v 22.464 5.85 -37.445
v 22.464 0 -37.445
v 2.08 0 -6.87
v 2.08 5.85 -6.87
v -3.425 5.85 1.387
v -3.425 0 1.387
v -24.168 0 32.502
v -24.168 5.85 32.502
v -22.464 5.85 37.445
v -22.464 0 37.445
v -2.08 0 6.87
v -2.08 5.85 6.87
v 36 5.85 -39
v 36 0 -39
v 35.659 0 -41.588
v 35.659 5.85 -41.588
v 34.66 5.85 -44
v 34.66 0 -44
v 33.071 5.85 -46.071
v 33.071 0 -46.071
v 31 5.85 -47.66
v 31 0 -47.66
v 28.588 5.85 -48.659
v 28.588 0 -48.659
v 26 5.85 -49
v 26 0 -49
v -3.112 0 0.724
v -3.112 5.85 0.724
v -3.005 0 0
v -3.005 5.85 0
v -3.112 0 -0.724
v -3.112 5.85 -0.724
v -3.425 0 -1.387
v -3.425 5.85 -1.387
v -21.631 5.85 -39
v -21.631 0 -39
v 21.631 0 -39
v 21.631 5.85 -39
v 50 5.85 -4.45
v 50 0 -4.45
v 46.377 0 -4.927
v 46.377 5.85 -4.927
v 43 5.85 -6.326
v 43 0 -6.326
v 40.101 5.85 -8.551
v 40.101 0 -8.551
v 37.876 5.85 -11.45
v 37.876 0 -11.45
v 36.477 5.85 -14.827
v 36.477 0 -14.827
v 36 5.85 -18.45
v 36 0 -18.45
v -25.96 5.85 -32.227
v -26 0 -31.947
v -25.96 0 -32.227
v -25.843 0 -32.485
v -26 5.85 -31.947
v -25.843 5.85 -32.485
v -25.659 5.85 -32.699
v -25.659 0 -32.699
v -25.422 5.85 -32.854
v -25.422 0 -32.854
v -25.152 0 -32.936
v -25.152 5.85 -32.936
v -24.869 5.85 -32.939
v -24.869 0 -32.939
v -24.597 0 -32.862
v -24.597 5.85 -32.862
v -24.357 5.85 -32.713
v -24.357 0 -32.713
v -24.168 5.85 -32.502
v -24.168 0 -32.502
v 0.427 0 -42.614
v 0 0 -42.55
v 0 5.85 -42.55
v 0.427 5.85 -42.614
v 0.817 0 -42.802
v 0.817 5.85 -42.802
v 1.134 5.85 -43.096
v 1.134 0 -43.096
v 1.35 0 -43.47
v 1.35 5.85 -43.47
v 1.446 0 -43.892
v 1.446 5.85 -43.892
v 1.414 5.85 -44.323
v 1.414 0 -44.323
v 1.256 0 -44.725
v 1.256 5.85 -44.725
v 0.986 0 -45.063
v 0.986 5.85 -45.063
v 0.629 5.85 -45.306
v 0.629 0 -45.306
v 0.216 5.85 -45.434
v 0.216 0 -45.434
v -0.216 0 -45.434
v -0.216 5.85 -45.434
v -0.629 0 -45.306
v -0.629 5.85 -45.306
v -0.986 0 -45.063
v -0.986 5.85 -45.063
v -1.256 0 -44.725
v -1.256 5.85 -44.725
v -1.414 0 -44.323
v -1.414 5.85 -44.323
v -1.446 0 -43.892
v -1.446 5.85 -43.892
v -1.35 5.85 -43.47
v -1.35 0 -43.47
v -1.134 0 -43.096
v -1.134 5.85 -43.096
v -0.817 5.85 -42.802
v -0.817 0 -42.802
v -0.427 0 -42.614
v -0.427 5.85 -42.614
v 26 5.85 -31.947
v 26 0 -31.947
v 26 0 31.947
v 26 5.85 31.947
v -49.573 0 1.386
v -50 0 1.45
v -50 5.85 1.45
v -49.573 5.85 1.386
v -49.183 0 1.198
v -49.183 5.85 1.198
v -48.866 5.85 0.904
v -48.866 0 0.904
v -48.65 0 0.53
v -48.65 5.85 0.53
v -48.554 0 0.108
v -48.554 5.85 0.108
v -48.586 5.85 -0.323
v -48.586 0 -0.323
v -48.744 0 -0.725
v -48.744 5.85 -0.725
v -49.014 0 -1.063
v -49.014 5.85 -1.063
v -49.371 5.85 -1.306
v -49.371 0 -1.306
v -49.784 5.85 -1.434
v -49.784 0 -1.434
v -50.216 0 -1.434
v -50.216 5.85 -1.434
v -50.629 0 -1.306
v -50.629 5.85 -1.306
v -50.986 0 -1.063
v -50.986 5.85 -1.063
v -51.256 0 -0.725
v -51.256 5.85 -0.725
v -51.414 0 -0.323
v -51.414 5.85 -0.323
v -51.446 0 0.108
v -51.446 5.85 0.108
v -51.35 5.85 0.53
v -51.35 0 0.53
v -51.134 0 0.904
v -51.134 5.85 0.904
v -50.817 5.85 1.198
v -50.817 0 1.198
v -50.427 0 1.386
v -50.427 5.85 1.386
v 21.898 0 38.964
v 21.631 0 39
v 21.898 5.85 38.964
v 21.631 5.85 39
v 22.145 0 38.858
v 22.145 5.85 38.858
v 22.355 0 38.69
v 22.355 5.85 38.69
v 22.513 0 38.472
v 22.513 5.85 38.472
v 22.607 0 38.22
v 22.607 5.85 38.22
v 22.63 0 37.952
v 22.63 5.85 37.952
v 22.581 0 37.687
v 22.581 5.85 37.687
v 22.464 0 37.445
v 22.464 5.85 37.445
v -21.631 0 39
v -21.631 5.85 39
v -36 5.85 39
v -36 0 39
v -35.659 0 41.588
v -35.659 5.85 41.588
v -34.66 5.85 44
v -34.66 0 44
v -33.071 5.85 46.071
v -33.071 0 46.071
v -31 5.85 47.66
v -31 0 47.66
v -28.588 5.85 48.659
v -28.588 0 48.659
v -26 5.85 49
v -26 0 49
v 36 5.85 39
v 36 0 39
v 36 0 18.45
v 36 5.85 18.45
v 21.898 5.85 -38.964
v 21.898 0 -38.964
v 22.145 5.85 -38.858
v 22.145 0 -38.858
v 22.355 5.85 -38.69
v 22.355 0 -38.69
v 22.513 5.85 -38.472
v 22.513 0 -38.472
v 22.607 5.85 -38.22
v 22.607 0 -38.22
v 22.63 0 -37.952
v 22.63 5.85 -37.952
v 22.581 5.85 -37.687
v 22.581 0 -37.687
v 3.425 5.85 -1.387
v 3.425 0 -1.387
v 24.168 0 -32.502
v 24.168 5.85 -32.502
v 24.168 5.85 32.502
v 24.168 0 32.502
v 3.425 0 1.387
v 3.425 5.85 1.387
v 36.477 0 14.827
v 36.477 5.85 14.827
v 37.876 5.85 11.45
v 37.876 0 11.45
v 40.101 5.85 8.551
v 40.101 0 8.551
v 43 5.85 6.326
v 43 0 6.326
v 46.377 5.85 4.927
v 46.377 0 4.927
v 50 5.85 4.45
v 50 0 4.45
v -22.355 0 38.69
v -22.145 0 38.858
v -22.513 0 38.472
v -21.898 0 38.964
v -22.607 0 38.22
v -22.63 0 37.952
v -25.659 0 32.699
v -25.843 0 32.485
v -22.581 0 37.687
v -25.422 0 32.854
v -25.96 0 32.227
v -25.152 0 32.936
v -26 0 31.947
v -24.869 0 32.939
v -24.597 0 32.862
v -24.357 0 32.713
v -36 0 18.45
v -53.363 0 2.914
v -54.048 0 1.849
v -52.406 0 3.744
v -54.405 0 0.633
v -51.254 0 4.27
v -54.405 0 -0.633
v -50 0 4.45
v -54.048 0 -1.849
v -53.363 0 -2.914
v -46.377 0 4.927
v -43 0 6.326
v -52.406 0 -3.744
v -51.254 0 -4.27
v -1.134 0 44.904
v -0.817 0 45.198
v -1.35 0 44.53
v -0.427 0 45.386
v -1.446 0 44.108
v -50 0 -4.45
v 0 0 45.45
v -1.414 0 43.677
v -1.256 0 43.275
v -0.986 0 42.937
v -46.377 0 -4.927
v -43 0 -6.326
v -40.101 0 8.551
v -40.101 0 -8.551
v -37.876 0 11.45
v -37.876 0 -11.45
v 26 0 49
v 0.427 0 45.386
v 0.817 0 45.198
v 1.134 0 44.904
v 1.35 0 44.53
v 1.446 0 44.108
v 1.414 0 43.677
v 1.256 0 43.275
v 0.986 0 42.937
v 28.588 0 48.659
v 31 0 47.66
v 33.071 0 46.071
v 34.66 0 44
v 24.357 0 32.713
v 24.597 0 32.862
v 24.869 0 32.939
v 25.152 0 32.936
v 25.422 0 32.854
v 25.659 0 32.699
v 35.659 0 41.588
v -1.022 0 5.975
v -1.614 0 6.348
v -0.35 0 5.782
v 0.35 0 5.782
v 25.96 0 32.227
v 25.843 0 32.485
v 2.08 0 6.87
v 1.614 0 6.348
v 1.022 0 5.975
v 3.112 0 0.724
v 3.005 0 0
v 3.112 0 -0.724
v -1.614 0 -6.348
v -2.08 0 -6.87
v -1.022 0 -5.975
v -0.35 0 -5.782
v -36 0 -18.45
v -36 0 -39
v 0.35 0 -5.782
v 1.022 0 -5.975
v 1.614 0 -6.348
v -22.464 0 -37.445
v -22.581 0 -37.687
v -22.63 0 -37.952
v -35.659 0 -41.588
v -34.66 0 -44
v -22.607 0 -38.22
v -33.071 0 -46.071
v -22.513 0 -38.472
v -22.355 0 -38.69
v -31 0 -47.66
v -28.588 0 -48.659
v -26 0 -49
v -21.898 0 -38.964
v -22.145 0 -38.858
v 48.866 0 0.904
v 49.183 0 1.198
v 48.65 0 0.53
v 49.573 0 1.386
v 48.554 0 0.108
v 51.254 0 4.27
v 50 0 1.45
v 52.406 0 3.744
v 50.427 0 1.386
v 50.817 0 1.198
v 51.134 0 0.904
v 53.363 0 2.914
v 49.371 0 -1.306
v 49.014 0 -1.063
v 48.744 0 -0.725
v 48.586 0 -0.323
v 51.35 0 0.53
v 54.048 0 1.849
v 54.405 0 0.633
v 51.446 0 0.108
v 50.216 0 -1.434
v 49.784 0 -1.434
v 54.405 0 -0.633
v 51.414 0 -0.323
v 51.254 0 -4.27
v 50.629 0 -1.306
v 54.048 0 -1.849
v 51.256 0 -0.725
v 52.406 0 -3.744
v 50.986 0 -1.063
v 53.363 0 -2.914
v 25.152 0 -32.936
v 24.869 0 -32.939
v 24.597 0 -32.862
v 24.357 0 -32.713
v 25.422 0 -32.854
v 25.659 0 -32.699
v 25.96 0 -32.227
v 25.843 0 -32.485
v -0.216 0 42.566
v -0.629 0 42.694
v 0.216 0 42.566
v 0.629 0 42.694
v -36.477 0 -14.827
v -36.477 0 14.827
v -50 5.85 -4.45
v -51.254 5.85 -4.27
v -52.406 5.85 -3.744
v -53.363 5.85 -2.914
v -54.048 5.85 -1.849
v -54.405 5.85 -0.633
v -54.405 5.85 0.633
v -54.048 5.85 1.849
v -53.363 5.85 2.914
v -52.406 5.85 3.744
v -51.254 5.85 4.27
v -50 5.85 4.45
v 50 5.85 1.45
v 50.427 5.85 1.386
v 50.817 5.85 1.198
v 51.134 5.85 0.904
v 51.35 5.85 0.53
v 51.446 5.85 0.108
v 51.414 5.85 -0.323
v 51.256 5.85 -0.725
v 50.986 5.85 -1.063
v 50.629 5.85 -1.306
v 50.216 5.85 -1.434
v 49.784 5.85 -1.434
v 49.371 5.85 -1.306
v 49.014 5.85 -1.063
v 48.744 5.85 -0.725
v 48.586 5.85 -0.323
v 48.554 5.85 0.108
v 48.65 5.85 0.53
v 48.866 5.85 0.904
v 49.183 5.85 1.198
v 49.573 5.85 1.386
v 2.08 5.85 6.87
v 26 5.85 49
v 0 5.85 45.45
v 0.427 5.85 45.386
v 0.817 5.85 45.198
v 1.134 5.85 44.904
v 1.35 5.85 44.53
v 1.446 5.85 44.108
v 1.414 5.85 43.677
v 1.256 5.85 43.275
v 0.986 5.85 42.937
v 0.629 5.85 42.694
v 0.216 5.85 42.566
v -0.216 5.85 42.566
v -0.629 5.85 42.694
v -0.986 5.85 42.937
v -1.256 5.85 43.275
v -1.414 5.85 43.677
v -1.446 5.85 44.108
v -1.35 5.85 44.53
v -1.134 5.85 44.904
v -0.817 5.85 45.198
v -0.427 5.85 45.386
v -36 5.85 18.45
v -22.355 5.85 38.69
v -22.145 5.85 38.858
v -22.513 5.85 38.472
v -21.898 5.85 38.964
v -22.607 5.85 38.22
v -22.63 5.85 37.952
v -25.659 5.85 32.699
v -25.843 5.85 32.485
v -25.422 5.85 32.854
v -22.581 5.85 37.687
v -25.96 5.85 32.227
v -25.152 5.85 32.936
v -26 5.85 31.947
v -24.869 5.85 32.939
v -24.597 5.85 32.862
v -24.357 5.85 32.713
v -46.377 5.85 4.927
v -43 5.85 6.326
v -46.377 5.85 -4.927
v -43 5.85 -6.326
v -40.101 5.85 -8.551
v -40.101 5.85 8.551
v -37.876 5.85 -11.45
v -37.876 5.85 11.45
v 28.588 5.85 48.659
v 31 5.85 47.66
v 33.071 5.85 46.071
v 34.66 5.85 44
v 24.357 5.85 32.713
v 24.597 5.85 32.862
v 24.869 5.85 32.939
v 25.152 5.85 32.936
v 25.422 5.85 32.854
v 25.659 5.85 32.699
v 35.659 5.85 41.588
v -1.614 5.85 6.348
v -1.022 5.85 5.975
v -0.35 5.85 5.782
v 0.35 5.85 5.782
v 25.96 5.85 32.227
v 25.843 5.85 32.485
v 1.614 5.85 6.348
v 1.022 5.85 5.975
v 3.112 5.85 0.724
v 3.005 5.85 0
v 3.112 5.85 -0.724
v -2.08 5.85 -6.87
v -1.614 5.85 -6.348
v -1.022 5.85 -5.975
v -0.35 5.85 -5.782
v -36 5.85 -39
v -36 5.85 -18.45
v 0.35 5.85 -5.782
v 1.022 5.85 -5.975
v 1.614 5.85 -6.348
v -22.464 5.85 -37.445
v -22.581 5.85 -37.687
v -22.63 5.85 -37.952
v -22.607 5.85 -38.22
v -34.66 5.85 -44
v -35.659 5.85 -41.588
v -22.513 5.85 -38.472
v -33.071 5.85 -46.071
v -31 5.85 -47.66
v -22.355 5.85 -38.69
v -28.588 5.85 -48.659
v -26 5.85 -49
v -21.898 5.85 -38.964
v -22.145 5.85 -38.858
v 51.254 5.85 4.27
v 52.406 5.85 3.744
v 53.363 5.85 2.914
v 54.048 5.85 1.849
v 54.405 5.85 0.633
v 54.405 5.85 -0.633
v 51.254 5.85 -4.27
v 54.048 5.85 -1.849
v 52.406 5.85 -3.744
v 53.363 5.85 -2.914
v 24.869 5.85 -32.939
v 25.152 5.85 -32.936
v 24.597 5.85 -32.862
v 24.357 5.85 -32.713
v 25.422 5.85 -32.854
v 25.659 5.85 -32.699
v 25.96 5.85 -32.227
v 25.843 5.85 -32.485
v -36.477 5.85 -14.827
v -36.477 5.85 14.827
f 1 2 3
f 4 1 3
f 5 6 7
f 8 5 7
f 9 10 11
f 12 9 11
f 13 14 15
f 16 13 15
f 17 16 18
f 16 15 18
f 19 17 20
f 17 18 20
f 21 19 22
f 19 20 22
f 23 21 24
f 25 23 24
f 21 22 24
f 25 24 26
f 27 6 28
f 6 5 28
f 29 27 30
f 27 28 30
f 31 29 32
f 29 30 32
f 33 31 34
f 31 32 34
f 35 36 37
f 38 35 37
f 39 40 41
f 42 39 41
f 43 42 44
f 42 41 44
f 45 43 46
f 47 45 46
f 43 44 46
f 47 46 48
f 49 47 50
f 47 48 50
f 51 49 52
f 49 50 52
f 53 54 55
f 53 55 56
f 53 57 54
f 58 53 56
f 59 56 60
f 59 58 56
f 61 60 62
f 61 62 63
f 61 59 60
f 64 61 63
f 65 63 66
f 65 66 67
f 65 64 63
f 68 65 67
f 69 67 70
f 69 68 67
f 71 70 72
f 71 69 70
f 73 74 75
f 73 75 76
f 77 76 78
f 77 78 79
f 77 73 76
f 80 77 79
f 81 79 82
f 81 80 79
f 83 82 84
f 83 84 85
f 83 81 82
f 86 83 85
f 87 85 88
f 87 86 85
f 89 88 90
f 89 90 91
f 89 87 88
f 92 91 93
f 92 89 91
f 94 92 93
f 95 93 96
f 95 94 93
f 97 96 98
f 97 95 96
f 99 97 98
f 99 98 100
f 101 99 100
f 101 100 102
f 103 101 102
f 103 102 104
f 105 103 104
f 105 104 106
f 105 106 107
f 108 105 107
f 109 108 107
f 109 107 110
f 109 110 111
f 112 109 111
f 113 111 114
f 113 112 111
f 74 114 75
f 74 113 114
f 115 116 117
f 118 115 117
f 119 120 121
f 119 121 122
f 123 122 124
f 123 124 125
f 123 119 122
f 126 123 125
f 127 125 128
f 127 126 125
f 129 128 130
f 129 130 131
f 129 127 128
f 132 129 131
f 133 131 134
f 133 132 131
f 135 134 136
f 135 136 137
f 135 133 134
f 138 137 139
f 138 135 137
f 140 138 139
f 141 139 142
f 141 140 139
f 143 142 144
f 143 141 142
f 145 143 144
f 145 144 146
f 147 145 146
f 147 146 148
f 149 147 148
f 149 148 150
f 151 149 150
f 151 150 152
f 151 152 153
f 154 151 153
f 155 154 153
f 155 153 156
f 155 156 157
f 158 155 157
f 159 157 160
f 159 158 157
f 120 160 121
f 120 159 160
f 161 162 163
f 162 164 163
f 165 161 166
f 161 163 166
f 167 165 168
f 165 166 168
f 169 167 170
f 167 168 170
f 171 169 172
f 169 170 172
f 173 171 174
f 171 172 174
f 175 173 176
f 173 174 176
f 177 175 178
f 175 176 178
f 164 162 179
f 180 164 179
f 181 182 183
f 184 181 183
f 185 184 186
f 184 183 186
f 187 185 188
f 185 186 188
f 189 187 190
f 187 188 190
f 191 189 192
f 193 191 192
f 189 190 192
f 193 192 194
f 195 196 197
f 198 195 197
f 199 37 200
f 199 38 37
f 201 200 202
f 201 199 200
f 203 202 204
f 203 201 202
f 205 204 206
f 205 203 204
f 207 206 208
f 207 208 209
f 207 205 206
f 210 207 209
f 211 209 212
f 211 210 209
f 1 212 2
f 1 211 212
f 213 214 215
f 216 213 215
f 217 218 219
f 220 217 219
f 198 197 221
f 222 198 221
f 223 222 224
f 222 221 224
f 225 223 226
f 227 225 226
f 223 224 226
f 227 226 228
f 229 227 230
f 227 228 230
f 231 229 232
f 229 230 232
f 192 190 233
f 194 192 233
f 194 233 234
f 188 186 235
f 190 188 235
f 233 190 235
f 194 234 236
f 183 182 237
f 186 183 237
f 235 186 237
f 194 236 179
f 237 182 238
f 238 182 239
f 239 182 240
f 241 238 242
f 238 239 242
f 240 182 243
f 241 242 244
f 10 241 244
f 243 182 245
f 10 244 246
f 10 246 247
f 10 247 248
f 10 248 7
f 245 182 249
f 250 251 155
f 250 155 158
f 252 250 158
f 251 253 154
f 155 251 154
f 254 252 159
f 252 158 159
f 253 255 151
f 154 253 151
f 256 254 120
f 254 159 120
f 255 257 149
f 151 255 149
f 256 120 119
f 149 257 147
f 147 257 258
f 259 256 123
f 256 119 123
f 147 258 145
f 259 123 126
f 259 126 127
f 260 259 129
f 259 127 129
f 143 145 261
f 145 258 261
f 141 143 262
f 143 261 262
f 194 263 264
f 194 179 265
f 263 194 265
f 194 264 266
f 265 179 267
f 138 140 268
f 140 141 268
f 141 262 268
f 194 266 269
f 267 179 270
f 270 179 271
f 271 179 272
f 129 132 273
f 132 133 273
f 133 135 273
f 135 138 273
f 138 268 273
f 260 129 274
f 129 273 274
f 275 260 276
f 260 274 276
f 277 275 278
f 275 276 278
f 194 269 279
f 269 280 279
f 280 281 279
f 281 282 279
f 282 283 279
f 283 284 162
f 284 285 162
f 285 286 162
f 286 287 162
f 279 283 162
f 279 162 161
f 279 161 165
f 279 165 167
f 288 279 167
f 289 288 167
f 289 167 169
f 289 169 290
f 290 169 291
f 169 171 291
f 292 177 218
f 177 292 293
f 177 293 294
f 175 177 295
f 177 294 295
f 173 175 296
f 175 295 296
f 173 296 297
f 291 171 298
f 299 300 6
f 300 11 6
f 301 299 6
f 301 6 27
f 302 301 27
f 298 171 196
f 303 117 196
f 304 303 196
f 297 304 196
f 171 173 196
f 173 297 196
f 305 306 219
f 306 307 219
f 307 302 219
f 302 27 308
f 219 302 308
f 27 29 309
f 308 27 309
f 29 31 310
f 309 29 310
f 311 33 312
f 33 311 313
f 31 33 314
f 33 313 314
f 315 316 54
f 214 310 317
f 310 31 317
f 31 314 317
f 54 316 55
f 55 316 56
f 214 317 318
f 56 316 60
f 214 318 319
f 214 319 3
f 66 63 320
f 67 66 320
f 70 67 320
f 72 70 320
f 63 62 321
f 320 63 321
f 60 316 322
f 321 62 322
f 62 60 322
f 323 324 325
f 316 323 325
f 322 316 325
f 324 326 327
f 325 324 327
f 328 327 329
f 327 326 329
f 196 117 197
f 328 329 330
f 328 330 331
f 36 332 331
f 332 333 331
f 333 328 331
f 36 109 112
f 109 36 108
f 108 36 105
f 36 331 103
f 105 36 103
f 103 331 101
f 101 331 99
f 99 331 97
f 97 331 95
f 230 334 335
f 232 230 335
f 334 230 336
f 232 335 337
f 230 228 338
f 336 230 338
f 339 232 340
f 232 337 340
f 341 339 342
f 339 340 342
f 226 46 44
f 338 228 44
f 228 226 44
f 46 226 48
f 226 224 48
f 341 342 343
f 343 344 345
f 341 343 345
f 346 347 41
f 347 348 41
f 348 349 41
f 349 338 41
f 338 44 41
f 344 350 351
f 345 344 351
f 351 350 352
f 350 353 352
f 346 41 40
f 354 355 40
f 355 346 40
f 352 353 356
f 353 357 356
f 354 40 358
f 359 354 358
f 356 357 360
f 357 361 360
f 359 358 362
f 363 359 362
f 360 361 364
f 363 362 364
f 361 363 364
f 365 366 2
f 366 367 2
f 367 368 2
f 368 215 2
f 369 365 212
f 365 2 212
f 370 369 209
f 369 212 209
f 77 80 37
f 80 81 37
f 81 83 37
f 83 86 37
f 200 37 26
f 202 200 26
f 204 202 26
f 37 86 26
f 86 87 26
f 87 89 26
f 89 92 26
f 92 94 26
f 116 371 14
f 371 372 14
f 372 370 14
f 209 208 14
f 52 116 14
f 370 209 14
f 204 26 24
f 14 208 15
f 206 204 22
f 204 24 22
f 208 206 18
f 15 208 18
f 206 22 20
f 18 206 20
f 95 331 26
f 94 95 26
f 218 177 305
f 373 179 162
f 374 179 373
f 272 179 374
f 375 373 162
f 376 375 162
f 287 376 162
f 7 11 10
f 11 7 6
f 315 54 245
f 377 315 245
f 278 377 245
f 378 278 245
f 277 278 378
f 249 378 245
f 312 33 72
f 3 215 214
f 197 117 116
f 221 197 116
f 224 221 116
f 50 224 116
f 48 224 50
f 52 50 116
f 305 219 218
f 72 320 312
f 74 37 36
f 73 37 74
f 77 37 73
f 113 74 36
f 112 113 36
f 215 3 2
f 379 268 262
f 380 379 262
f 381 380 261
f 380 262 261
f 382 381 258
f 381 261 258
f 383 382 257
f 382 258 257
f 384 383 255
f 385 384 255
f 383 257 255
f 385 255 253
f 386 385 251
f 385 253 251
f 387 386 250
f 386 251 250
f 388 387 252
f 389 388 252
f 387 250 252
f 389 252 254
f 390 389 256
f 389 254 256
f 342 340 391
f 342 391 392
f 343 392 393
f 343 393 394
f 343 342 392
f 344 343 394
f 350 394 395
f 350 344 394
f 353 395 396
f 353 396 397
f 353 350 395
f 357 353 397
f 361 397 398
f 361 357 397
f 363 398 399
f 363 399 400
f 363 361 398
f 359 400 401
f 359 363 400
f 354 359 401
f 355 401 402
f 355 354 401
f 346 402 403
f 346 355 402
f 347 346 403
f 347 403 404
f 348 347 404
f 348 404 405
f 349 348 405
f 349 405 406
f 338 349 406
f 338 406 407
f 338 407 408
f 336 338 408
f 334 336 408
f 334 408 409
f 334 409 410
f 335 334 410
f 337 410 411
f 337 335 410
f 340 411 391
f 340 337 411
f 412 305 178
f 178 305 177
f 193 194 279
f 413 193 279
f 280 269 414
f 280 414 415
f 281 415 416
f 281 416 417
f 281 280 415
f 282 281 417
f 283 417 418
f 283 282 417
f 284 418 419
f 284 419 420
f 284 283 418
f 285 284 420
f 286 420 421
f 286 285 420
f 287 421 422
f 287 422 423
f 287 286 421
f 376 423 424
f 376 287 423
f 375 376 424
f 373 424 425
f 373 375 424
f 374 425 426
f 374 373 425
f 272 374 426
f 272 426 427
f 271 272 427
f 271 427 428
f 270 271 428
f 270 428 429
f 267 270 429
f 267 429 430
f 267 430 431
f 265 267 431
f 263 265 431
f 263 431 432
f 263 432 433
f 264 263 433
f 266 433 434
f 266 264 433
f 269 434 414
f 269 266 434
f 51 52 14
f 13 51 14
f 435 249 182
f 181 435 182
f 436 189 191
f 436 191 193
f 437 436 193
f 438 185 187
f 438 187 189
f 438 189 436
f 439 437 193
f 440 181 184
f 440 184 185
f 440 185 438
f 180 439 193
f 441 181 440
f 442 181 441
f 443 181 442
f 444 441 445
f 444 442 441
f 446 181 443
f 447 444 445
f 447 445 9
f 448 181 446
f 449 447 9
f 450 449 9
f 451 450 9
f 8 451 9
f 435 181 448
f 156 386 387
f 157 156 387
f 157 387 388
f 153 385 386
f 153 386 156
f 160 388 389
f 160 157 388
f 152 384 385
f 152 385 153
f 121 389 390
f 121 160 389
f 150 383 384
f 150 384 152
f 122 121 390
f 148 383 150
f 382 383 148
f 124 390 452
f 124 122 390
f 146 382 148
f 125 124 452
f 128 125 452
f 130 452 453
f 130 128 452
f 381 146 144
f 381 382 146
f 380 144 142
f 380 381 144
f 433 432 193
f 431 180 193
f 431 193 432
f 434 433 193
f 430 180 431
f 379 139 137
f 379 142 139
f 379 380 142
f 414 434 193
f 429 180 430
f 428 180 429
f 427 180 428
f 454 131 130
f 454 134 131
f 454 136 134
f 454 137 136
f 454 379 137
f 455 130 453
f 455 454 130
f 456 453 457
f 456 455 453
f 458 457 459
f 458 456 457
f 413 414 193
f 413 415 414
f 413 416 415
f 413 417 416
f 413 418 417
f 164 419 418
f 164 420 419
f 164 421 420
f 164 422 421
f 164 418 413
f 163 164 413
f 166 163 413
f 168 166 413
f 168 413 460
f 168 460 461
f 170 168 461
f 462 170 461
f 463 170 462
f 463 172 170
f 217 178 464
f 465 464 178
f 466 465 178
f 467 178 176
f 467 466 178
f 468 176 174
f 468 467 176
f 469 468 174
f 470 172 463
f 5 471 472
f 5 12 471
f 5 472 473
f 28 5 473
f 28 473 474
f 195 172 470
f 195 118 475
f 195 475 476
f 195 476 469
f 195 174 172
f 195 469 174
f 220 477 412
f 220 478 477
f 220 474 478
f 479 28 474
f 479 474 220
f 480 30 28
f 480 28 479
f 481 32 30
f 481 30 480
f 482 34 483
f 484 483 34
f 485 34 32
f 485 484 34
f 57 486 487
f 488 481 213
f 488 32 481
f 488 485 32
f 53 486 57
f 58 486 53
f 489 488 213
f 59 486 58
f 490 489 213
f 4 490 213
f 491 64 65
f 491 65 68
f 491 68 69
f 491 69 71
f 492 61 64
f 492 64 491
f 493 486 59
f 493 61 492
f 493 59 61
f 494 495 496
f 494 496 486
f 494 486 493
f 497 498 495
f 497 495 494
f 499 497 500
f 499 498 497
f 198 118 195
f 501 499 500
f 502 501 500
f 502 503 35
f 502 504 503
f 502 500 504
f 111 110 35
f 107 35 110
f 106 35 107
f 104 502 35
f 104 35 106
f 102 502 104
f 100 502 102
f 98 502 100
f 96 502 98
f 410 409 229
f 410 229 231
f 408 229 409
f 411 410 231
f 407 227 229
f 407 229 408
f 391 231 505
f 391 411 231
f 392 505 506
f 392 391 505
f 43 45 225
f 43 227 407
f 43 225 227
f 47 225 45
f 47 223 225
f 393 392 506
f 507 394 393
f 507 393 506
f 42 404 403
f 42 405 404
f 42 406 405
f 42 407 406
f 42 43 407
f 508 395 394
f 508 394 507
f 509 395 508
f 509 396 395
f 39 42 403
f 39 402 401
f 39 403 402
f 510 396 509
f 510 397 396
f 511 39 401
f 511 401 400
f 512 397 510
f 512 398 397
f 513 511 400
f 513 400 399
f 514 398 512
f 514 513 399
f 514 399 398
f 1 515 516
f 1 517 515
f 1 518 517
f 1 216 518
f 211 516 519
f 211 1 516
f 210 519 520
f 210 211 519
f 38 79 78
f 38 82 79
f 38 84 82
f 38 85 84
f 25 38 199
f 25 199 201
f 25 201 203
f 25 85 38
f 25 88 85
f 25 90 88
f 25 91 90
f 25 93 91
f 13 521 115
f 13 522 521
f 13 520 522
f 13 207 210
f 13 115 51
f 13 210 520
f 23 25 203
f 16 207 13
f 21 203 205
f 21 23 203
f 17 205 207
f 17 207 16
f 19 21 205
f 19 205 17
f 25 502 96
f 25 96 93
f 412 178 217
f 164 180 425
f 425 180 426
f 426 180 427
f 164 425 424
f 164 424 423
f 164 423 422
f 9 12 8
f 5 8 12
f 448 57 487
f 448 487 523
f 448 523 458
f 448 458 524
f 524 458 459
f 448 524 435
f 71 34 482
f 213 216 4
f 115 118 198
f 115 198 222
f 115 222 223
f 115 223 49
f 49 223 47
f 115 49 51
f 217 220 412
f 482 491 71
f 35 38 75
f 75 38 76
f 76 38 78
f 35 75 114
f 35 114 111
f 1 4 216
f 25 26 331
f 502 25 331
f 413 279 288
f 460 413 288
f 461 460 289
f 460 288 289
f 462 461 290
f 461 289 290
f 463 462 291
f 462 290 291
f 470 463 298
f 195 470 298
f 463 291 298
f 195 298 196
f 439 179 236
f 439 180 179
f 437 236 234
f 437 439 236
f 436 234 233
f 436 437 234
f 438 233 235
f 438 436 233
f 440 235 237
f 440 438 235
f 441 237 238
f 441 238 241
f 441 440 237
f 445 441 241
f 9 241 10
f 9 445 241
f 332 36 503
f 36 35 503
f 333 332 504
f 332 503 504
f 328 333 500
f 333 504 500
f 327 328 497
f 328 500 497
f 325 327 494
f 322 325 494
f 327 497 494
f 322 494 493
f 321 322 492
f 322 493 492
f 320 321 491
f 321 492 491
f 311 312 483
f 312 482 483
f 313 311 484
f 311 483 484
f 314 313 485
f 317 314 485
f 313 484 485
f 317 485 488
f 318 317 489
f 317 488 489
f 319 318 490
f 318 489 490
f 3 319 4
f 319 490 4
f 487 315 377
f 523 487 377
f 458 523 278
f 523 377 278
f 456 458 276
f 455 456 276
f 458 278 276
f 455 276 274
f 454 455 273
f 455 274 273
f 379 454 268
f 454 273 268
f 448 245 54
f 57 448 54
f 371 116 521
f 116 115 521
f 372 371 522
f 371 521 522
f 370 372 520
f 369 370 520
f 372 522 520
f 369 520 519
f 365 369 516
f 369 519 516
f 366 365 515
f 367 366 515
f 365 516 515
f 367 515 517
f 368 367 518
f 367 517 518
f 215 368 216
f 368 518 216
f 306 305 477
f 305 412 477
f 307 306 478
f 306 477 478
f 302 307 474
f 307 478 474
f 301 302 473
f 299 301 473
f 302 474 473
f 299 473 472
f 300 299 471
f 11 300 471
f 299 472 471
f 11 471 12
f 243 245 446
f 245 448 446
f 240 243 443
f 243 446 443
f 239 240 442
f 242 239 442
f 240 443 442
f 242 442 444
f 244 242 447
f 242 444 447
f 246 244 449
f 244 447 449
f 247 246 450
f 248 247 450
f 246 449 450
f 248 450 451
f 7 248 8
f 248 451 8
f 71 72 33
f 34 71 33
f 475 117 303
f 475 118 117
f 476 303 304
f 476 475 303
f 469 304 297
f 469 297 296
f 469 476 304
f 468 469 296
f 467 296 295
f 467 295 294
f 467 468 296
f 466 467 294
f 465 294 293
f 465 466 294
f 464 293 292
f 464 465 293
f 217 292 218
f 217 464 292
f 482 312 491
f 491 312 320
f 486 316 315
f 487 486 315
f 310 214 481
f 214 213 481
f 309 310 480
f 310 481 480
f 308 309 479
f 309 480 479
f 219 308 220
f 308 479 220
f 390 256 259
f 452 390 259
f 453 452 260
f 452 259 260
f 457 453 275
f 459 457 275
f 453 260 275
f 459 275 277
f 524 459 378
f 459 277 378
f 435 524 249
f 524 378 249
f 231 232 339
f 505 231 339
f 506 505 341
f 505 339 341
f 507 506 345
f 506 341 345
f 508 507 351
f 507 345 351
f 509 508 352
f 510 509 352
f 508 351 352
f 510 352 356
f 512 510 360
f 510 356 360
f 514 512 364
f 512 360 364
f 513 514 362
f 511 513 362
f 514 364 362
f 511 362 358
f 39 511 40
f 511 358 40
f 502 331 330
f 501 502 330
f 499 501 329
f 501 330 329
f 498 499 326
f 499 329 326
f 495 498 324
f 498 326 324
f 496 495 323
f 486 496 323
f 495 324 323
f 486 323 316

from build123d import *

# Parameters (mm, degrees)
SKETCH1_R           = 1.45
BOSS_EXTRUDE1_DEPTH = 5.85
FILLET1_R           = 1
FILLET2_R           = 2.5


with BuildPart() as part:
    # Sketch1 → Boss-Extrude1 (new body)
    with BuildSketch(Plane(origin=(0, 0, 0), x_dir=(1, 0, 0), z_dir=(0, 1, 0))):
        with BuildLine():
            ThreePointArc((-26, 49), (-33.071067812, 46.071067812), (-36, 39))
            Line((-36, 39), (-36, 18.45))
            ThreePointArc((-36, 18.45), (-40.100505063, 8.550505063), (-50, 4.45))
            ThreePointArc((-50, 4.45), (-54.45, 0), (-50, -4.45))
            ThreePointArc((-50, -4.45), (-40.100505063, -8.550505063), (-36, -18.45))
            Line((-36, -18.45), (-36, -39))
            ThreePointArc((-36, -39), (-33.071067812, -46.071067812), (-26, -49))
            Line((-26, -49), (26, -49))
            ThreePointArc((26, -49), (33.071067812, -46.071067812), (36, -39))
            Line((36, -39), (36, -18.45))
            ThreePointArc((36, -18.45), (40.100505063, -8.550505063), (50, -4.45))
            ThreePointArc((50, -4.45), (54.45, 0), (50, 4.45))
            ThreePointArc((50, 4.45), (40.100505063, 8.550505063), (36, 18.45))
            Line((36, 18.45), (36, 39))
            ThreePointArc((36, 39), (33.071067812, 46.071067812), (26, 49))
            Line((26, 49), (-26, 49))
        make_face()
        Polygon((-23.5, -39), (0, -3.75), (23.5, -39), align=None, mode=Mode.SUBTRACT)
        Polygon((26, -35.25), (2.5, 0), (26, 35.25), align=None, mode=Mode.SUBTRACT)
        Polygon((23.5, 39), (0, 3.75), (-23.5, 39), align=None, mode=Mode.SUBTRACT)
        Polygon((-26, 35.25), (-2.5, 0), (-26, -35.25), align=None, mode=Mode.SUBTRACT)
        with Locations(Location((-50, 0, 0), (0, 0, 270))):
            Circle(SKETCH1_R, mode=Mode.SUBTRACT)
        with Locations(Location((0, 44, 0), (0, 0, 270))):
            Circle(SKETCH1_R, mode=Mode.SUBTRACT)
        with Locations(Location((50, 0, 0), (0, 0, 270))):
            Circle(SKETCH1_R, mode=Mode.SUBTRACT)
        with Locations(Location((0, -44, 0), (0, 0, 270))):
            Circle(SKETCH1_R, mode=Mode.SUBTRACT)
    extrude(amount=BOSS_EXTRUDE1_DEPTH)

    # Fillet1
    fillet1_edges = [part.edges().sort_by_distance(p)[0] for p in [
        (-23.5, 2.925, 39),
        (23.5, 2.925, 39),
        (23.5, 2.925, -39),
        (-23.5, 2.925, -39),
        (26, 2.925, 35.25),
        (26, 2.925, -35.25),
        (-26, 2.925, -35.25),
        (-26, 2.925, 35.25),
    ]]
    fillet(fillet1_edges, radius=FILLET1_R)

    # Fillet2
    fillet2_edges = [part.edges().sort_by_distance(p)[0] for p in [
        (0, 2.925, 3.75),
        (0, 2.925, -3.75),
        (2.5, 2.925, 0),
        (-2.5, 2.925, 0),
    ]]
    fillet(fillet2_edges, radius=FILLET2_R)


solid = part.part
